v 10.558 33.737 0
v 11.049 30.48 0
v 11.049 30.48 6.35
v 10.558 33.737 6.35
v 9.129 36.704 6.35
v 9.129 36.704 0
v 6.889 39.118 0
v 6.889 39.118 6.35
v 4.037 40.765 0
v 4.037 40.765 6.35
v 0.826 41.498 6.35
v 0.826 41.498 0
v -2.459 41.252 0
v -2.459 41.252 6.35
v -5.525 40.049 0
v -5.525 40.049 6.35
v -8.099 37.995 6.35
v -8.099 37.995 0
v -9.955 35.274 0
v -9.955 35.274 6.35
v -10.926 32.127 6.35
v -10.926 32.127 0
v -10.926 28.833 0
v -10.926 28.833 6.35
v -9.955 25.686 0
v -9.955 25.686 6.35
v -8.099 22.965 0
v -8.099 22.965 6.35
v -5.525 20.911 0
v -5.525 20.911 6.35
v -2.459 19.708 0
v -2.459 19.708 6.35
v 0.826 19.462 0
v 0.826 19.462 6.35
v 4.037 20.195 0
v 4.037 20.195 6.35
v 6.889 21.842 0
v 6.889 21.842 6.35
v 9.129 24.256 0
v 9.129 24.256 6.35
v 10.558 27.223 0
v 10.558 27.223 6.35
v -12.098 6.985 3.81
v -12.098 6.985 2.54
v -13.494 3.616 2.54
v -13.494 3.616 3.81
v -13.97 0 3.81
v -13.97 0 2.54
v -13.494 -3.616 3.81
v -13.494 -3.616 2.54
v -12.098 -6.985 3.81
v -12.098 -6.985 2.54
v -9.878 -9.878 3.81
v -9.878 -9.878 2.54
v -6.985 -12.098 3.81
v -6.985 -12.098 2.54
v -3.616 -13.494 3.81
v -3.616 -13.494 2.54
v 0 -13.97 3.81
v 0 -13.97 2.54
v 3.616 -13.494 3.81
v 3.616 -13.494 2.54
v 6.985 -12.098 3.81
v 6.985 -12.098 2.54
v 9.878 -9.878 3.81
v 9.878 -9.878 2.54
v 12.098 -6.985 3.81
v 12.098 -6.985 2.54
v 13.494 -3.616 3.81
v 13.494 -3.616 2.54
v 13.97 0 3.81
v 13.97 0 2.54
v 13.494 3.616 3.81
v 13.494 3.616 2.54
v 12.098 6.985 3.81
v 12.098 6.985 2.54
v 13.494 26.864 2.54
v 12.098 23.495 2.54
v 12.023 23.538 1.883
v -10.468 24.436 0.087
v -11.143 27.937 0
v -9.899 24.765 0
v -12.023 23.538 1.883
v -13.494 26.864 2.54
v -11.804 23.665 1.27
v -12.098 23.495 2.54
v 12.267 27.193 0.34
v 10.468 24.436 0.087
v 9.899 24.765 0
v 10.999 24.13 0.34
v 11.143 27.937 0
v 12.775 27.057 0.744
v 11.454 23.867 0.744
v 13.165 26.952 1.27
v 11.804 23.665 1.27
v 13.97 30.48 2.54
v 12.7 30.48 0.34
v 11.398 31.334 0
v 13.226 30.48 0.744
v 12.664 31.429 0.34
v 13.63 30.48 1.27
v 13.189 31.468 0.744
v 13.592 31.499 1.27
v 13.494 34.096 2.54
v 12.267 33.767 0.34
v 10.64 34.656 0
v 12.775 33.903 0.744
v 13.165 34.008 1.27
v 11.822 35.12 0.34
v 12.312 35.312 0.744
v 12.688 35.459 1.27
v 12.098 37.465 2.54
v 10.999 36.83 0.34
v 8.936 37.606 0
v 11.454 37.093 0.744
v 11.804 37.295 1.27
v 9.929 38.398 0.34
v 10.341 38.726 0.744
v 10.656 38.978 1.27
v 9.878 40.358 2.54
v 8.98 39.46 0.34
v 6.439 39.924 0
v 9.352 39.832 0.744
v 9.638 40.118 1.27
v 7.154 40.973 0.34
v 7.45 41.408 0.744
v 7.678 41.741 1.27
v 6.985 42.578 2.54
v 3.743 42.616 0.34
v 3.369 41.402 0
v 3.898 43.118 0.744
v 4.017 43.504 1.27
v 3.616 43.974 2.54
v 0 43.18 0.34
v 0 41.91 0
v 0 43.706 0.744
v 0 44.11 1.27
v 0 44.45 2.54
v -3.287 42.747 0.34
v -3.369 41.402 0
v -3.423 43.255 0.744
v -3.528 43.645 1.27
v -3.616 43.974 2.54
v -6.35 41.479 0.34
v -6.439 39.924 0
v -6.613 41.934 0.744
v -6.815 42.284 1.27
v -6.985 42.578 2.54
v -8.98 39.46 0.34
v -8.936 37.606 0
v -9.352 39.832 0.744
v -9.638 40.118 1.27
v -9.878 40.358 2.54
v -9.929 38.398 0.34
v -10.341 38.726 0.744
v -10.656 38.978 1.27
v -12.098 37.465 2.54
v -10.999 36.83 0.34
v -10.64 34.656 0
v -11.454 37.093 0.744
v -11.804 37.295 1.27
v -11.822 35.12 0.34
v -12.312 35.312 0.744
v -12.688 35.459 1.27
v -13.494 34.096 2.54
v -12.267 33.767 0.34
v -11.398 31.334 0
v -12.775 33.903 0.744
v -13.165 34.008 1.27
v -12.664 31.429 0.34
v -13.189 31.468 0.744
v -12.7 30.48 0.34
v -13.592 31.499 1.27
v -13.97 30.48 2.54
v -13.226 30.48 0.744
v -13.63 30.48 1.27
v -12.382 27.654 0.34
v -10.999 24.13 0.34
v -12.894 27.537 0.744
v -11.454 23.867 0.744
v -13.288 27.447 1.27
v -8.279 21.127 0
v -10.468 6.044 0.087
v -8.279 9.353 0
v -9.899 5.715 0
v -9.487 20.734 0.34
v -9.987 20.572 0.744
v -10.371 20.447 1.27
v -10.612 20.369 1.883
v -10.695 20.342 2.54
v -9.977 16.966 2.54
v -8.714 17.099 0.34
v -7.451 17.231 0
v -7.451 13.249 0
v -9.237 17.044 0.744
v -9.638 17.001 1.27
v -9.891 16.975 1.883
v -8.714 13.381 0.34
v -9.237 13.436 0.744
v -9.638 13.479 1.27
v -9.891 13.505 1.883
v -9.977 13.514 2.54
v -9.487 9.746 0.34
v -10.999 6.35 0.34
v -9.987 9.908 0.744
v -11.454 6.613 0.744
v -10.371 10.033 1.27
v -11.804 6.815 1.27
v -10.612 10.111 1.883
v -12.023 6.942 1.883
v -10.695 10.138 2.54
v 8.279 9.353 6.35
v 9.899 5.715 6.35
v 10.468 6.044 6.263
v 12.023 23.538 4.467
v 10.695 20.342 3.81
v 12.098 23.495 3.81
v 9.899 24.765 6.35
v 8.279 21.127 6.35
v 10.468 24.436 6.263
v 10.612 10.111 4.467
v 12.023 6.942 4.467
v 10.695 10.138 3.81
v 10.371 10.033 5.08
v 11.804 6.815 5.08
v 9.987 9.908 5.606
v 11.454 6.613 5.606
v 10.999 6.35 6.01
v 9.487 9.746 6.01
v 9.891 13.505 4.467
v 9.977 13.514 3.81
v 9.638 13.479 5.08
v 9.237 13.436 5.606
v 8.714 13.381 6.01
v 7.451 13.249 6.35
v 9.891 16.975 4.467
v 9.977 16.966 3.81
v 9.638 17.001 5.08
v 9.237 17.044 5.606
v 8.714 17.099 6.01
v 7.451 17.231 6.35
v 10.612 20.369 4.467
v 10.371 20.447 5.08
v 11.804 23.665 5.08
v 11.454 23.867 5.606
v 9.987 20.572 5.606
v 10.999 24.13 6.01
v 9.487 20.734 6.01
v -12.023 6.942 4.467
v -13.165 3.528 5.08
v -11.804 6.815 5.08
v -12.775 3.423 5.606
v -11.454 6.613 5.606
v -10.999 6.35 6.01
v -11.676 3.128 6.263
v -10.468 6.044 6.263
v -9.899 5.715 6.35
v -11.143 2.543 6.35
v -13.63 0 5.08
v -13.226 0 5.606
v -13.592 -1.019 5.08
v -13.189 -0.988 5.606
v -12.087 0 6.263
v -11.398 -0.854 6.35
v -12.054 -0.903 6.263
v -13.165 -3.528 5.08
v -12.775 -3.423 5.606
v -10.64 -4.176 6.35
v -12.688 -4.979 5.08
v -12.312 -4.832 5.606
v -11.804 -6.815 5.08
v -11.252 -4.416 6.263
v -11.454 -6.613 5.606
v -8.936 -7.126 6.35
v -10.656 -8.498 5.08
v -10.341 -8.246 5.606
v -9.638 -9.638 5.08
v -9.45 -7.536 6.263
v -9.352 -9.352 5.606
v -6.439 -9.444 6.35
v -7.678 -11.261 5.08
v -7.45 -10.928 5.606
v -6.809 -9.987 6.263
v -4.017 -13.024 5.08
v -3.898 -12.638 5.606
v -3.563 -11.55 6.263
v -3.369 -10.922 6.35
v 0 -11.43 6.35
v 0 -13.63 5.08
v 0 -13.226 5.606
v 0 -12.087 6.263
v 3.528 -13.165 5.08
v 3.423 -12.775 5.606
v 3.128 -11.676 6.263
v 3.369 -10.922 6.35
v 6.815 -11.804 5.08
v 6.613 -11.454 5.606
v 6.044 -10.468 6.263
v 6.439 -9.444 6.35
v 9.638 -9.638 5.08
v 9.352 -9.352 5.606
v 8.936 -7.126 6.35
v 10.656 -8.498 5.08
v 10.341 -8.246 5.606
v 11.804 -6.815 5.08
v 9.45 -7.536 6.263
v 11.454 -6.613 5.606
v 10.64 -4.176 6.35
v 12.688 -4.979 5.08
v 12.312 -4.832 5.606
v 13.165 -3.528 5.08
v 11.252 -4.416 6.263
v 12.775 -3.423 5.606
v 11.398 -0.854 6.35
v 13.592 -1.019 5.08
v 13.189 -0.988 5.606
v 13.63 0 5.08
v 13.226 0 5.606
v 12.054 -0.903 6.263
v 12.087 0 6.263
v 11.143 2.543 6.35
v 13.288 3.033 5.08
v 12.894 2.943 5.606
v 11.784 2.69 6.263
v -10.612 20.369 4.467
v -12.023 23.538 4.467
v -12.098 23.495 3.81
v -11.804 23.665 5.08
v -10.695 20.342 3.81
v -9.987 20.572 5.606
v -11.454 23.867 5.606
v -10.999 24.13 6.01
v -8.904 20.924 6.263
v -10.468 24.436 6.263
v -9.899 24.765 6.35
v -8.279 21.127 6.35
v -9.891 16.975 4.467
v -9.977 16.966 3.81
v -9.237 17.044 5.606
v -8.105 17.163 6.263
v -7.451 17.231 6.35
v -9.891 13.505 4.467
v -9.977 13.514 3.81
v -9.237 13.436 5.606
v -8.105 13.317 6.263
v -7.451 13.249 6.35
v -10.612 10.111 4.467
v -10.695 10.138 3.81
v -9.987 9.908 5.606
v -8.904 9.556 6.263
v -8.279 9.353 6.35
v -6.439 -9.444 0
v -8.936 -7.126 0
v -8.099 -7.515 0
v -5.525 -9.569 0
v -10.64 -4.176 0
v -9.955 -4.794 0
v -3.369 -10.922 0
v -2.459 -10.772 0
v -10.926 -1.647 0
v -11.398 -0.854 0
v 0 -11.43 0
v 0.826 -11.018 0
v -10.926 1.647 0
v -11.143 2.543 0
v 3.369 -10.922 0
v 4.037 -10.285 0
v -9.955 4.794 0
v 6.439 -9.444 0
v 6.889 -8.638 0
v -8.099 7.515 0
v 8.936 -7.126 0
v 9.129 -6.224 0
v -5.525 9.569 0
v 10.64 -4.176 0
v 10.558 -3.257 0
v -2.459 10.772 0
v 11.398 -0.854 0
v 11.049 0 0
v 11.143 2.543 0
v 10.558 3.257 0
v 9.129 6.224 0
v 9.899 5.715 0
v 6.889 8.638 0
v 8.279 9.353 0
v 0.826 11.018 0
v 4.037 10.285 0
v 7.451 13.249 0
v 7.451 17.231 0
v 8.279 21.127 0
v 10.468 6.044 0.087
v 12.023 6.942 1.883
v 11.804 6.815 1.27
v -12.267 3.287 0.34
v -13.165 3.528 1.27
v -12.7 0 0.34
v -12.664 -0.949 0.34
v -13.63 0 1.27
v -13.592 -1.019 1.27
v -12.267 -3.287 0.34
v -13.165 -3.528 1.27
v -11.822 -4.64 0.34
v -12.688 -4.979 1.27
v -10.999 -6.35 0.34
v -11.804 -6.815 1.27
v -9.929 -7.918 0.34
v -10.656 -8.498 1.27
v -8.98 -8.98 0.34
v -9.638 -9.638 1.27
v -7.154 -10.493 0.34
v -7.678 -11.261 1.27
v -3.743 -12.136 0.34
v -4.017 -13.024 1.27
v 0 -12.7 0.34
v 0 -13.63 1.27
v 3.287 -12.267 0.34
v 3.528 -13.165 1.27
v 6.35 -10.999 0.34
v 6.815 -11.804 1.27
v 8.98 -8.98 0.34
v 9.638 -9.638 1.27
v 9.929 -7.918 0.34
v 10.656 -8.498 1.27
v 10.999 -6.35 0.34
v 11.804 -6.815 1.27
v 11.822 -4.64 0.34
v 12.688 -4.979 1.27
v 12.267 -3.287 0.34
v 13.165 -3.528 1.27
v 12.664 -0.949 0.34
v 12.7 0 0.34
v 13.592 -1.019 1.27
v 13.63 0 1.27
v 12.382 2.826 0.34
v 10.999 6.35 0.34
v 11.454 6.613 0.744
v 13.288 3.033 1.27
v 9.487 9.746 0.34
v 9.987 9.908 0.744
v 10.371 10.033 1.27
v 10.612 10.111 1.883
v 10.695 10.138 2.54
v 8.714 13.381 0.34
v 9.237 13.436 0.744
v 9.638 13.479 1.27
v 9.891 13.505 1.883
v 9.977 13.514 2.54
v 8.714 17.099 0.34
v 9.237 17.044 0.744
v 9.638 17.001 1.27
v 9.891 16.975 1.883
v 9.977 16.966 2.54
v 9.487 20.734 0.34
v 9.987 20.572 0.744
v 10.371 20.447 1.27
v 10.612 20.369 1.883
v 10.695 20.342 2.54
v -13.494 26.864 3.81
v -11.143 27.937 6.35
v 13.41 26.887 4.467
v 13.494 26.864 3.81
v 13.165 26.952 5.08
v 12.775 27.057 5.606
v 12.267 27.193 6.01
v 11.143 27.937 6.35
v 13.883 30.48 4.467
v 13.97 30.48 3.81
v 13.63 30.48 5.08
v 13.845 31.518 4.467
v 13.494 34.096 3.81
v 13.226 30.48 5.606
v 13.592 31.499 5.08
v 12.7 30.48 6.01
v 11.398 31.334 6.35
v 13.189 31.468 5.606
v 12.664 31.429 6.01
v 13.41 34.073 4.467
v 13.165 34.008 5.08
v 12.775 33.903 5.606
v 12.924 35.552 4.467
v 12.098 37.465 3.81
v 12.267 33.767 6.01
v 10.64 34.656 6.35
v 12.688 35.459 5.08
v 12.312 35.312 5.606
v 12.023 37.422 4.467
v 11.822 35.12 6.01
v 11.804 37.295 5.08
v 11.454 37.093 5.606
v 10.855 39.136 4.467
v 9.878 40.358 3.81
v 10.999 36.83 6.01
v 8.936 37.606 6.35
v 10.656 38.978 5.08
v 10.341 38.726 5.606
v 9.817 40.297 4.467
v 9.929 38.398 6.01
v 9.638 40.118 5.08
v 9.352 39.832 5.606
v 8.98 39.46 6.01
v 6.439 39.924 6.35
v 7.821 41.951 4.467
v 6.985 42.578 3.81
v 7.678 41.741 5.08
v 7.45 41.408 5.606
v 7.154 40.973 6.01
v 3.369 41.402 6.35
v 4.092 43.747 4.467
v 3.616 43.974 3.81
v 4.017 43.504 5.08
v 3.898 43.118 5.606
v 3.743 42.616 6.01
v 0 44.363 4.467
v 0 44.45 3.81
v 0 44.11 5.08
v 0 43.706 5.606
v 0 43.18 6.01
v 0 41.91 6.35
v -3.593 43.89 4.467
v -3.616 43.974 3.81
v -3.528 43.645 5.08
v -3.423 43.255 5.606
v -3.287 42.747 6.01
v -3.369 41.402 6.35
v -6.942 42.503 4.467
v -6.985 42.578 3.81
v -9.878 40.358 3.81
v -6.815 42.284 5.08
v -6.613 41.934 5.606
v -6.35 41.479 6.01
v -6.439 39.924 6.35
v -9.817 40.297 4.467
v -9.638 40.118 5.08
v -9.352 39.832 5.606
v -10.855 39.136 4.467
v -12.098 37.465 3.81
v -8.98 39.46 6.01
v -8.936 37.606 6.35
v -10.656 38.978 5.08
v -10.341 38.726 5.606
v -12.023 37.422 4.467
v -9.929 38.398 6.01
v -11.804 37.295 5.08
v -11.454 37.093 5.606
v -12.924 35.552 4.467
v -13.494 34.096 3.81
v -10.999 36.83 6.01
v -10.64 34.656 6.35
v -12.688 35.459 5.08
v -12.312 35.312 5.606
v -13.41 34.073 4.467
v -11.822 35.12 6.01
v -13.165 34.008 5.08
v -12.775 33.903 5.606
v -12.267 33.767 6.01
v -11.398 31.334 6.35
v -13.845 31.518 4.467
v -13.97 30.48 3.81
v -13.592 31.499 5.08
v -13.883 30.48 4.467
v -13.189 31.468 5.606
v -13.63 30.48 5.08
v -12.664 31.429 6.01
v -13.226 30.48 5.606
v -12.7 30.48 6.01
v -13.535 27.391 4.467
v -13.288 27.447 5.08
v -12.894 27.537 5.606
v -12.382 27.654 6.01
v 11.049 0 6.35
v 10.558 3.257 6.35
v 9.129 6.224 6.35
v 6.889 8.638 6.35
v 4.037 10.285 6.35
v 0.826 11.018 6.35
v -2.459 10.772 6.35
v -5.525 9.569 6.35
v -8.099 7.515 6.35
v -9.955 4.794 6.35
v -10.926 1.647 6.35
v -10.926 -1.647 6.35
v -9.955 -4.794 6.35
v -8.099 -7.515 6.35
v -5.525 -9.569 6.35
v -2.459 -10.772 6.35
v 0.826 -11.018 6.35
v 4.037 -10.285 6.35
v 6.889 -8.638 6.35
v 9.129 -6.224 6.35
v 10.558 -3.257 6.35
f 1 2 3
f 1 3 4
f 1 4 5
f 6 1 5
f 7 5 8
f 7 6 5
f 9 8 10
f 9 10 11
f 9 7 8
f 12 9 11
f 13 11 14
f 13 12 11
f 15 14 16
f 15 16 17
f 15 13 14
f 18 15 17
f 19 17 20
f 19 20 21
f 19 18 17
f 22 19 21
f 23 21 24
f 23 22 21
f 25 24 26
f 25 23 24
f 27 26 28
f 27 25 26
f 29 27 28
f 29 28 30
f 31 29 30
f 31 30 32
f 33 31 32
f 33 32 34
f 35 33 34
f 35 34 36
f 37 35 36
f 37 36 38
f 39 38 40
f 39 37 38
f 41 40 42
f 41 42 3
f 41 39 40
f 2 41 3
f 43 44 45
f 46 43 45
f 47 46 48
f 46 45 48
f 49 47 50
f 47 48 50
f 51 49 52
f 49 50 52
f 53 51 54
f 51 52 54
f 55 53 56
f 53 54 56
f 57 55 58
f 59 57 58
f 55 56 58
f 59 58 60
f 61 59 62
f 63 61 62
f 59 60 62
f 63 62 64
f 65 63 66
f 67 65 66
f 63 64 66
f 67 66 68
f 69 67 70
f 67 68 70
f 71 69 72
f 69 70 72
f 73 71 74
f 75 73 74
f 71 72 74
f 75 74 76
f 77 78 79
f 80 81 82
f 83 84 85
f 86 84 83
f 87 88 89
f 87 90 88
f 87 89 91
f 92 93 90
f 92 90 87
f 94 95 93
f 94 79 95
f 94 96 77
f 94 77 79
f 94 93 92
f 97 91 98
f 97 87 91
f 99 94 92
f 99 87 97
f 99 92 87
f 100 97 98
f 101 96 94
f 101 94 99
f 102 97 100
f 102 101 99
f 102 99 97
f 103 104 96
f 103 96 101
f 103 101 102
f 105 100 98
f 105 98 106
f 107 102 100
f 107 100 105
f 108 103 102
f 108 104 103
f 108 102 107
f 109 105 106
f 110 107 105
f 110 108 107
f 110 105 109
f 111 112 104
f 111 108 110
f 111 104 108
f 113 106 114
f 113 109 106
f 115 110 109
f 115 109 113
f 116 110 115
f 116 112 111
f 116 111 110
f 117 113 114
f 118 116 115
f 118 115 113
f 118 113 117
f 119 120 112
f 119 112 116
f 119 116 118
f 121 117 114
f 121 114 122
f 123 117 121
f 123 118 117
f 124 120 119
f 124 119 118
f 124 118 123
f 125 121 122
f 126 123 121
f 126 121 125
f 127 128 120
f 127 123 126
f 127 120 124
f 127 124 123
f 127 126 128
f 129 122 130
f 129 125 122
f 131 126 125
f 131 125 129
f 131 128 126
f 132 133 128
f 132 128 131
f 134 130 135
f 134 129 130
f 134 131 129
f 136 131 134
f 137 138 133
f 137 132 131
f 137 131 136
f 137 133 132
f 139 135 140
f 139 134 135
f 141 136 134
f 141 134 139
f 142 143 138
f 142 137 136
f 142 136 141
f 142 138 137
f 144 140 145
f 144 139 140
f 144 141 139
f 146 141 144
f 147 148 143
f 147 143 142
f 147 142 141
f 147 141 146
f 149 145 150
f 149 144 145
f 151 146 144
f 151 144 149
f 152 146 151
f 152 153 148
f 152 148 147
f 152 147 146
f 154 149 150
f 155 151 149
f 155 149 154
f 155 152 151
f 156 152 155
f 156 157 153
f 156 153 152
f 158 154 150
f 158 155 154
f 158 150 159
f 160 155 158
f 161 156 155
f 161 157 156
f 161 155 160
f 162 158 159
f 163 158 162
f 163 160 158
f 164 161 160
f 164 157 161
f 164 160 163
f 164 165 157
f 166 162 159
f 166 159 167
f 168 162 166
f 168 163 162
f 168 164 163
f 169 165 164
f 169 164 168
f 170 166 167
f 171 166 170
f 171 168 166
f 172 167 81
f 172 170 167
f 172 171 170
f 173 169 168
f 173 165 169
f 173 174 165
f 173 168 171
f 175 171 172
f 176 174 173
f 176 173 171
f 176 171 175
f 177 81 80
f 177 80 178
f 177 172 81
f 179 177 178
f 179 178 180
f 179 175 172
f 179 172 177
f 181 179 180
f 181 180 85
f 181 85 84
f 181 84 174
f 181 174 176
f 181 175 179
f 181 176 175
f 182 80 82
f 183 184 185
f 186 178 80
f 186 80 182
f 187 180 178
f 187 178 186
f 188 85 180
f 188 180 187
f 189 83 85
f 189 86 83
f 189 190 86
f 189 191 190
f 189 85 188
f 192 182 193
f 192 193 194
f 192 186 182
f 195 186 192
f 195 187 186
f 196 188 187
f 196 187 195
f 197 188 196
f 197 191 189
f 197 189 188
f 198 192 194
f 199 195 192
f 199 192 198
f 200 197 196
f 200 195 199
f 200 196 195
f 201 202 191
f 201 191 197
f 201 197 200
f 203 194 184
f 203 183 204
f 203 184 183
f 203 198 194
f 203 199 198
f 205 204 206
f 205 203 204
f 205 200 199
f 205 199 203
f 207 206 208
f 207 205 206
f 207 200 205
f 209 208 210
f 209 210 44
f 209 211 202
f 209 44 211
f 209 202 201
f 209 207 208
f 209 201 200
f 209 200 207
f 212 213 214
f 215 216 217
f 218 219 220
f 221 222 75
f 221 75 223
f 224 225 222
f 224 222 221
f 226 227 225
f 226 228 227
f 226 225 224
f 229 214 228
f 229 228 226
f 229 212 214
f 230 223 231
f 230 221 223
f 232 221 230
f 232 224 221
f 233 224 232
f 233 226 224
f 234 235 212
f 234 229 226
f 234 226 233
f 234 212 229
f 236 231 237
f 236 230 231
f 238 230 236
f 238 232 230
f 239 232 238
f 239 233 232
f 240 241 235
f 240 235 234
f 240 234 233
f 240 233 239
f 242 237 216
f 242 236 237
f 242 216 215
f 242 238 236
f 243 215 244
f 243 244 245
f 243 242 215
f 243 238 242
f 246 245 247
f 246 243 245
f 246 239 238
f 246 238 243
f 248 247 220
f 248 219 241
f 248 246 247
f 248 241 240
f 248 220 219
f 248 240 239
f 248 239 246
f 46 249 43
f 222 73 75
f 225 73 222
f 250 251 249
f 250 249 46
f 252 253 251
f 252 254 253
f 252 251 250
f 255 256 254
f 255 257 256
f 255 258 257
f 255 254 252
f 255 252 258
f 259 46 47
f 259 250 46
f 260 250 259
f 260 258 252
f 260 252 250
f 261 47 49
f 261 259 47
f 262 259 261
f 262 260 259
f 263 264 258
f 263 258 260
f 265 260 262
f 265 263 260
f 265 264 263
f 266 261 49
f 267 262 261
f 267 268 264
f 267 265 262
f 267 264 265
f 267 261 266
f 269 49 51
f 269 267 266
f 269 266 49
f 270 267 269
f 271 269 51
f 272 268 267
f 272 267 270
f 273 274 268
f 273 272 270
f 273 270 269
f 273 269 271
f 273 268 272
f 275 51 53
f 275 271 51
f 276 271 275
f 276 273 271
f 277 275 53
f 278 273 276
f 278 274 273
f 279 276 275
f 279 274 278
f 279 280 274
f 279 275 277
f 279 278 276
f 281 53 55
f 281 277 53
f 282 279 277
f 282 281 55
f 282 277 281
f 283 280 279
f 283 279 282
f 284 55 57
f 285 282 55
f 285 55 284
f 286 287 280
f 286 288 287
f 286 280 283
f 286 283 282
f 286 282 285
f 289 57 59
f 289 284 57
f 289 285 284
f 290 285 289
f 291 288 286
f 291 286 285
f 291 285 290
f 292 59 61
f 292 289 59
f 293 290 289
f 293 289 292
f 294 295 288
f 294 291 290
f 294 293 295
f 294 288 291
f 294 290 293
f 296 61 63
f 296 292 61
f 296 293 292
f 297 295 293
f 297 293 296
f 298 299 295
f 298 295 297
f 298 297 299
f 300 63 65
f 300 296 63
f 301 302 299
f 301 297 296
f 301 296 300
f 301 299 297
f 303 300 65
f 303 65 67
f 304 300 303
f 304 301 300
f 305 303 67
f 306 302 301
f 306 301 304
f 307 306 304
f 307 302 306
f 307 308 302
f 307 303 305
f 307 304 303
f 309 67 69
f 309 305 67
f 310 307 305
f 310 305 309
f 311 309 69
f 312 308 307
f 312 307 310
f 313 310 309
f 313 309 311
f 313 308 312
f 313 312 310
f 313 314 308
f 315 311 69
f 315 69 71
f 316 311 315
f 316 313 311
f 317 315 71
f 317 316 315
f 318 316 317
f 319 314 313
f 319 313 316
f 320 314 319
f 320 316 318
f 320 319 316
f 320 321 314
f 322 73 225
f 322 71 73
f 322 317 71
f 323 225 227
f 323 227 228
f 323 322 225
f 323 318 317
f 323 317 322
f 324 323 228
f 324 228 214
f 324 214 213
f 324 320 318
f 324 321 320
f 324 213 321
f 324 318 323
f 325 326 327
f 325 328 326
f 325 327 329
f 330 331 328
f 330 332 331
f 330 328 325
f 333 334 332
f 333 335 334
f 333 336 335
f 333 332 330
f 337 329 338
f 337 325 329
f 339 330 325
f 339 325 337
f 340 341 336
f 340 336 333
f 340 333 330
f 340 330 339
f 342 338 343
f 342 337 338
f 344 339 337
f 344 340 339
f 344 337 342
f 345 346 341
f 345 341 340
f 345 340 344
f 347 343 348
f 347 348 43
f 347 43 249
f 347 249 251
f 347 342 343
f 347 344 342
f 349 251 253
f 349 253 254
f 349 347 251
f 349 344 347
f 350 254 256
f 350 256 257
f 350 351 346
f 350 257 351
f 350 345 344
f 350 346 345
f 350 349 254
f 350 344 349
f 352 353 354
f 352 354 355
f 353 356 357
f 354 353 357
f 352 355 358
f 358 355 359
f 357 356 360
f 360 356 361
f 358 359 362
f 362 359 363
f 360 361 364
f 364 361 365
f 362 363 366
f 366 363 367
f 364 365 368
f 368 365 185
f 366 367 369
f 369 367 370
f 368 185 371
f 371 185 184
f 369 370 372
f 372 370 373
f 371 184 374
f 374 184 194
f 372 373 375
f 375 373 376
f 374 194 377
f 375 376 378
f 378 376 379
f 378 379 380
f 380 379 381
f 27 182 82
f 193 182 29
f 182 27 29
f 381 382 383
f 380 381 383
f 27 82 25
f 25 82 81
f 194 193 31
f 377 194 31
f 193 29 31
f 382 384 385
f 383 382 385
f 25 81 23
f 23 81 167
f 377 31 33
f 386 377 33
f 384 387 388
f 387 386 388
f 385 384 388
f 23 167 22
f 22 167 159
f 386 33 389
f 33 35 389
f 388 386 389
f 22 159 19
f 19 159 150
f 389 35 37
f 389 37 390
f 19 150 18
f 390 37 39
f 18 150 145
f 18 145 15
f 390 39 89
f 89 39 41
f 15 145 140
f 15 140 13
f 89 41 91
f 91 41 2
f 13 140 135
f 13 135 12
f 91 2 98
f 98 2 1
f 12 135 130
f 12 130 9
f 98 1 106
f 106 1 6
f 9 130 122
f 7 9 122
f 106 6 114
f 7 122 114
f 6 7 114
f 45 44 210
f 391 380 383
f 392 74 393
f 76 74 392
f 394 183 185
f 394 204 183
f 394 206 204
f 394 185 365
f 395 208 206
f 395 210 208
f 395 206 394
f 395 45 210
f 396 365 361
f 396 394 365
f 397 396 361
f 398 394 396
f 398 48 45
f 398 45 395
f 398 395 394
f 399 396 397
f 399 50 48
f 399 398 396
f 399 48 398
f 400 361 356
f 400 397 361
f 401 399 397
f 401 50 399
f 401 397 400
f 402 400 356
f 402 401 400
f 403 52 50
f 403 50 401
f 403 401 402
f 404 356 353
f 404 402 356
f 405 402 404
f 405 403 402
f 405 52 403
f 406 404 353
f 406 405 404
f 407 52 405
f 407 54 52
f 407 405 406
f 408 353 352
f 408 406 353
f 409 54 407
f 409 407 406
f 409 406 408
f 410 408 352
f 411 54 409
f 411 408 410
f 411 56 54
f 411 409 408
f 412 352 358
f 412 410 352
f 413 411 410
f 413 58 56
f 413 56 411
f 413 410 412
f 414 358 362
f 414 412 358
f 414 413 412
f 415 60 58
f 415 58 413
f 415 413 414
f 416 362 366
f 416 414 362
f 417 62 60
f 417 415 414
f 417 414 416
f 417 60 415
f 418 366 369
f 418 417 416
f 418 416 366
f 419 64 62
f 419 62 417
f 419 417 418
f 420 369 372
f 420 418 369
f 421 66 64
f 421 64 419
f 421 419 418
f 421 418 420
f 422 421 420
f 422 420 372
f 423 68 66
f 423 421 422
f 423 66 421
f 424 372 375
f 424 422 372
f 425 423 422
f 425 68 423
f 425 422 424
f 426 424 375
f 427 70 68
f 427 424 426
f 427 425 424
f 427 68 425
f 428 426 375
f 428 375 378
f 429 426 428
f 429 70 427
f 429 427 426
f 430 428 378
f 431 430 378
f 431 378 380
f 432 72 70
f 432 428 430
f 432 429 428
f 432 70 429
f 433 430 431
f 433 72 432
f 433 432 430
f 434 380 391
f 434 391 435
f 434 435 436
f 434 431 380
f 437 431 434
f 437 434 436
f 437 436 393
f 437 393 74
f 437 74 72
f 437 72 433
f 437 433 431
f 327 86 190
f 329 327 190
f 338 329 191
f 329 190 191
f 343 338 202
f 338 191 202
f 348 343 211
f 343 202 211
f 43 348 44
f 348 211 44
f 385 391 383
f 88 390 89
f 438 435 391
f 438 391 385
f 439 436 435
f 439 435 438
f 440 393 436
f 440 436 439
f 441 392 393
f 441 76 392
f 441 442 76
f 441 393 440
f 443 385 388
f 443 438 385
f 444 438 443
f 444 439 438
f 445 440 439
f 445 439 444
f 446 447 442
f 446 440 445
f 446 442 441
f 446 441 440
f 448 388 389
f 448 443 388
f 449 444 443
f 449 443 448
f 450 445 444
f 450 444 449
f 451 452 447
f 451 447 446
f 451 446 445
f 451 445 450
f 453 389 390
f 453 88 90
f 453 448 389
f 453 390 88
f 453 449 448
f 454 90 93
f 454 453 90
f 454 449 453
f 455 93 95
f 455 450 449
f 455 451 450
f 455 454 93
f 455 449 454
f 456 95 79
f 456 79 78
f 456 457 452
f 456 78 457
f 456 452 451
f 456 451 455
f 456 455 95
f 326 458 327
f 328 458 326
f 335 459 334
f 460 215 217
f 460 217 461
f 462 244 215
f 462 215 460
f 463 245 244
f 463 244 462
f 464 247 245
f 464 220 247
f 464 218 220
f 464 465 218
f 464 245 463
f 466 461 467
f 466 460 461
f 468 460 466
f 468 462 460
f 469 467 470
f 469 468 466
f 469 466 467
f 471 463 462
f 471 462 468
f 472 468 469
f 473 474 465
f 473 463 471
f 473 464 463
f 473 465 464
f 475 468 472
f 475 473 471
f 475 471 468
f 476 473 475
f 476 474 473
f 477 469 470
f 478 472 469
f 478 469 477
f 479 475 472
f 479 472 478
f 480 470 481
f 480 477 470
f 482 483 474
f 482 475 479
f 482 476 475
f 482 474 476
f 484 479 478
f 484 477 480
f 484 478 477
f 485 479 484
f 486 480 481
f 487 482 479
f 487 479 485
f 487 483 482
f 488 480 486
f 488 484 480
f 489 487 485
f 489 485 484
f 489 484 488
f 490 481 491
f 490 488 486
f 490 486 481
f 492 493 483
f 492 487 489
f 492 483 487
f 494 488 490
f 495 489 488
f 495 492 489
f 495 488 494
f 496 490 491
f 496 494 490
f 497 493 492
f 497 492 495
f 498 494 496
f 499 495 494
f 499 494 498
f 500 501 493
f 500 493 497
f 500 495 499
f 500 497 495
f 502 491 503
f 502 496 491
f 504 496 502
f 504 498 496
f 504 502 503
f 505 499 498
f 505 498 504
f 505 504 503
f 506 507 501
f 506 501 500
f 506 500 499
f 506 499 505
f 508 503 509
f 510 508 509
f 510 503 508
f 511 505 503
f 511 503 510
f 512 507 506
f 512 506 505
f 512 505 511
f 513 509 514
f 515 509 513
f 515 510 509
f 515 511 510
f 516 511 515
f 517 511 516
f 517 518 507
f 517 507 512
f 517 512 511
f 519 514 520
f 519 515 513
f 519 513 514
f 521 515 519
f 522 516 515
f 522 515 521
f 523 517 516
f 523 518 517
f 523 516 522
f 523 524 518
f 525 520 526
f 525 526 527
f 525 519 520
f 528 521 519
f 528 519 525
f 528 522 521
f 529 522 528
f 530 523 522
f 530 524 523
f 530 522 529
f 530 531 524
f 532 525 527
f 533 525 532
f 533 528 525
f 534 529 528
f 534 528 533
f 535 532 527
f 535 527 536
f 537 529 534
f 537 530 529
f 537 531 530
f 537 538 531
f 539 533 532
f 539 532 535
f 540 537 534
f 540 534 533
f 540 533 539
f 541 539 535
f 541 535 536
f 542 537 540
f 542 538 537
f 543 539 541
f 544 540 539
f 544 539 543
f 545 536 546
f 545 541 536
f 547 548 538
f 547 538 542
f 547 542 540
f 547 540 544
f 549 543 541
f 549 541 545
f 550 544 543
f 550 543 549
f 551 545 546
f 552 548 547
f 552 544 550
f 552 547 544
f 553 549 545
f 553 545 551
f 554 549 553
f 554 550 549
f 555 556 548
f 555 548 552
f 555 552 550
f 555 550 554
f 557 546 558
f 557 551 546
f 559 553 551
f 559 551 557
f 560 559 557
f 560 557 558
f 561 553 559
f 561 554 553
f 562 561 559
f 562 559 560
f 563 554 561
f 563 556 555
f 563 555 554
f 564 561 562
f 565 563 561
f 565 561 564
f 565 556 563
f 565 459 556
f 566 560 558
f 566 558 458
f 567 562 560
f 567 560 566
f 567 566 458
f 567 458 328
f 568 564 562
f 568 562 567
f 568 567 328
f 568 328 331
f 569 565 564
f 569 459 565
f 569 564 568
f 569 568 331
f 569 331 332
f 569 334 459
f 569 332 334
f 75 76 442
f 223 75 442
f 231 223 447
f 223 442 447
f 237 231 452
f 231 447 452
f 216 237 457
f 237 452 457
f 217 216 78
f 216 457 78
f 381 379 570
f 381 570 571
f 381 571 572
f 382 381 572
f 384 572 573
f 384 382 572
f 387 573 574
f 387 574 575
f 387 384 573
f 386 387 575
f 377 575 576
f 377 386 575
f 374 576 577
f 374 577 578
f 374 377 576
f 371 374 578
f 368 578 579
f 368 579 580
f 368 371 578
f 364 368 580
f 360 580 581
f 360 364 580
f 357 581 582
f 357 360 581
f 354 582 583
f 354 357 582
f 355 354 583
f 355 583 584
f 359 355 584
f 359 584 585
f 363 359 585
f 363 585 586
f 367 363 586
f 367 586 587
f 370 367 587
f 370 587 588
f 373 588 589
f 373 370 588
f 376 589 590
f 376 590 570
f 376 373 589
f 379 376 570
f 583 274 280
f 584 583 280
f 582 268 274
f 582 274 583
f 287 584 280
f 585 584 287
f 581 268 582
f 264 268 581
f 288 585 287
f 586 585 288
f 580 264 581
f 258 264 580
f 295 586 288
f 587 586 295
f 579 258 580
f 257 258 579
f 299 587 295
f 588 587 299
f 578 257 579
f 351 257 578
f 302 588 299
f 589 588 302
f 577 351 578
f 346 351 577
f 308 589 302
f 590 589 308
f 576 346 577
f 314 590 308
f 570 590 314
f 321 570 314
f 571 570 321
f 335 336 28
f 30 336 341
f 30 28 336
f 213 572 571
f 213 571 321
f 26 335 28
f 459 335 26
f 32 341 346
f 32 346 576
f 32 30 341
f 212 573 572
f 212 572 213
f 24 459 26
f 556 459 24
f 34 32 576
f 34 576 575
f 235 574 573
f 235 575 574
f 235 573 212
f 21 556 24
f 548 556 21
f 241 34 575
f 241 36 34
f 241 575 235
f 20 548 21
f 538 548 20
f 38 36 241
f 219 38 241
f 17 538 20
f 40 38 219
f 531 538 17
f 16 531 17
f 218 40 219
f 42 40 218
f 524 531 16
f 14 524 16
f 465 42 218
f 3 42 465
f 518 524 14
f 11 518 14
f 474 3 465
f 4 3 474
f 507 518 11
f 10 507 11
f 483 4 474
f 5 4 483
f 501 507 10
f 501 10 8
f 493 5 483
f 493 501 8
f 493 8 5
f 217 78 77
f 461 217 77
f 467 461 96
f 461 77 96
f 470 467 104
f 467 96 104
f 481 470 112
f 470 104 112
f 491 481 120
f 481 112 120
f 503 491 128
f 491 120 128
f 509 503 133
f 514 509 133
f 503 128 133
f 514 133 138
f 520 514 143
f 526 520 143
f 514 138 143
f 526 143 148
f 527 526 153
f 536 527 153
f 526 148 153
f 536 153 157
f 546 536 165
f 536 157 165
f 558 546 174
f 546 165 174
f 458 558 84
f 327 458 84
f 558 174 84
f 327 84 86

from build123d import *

# Parameters (mm, degrees)
F0_R     = 11.049
F1_DEPTH = 6.35
F2_R     = 2.54
F3_R     = 2.54


with BuildPart() as f1:
    # F0 (on Top) → F1 (new body)
    with BuildSketch(Plane.XY):
        with BuildLine():
            ThreePointArc((-12.098375, 23.495), (-9.886454, 15.24), (-12.098375, 6.985))
            ThreePointArc((-12.098375, 6.985), (0, -13.97), (12.098375, 6.985))
            ThreePointArc((12.098375, 6.985), (9.886454, 15.24), (12.098375, 23.495))
            ThreePointArc((12.098375, 23.495), (0, 44.45), (-12.098375, 23.495))
        make_face()
        Circle(F0_R, mode=Mode.SUBTRACT)
        with Locations((0, 30.48)):
            Circle(F0_R, mode=Mode.SUBTRACT)
    extrude(amount=F1_DEPTH)

    # F2
    f2_edges = [f1.edges().sort_by_distance(p)[0] for p in [
        (0, -13.97, 6.35),
    ]]
    fillet(f2_edges, radius=F2_R)

    # F3
    f3_edges = [f1.edges().sort_by_distance(p)[0] for p in [
        (0, -13.97, 0),
    ]]
    fillet(f3_edges, radius=F3_R)


solid = f1.part
